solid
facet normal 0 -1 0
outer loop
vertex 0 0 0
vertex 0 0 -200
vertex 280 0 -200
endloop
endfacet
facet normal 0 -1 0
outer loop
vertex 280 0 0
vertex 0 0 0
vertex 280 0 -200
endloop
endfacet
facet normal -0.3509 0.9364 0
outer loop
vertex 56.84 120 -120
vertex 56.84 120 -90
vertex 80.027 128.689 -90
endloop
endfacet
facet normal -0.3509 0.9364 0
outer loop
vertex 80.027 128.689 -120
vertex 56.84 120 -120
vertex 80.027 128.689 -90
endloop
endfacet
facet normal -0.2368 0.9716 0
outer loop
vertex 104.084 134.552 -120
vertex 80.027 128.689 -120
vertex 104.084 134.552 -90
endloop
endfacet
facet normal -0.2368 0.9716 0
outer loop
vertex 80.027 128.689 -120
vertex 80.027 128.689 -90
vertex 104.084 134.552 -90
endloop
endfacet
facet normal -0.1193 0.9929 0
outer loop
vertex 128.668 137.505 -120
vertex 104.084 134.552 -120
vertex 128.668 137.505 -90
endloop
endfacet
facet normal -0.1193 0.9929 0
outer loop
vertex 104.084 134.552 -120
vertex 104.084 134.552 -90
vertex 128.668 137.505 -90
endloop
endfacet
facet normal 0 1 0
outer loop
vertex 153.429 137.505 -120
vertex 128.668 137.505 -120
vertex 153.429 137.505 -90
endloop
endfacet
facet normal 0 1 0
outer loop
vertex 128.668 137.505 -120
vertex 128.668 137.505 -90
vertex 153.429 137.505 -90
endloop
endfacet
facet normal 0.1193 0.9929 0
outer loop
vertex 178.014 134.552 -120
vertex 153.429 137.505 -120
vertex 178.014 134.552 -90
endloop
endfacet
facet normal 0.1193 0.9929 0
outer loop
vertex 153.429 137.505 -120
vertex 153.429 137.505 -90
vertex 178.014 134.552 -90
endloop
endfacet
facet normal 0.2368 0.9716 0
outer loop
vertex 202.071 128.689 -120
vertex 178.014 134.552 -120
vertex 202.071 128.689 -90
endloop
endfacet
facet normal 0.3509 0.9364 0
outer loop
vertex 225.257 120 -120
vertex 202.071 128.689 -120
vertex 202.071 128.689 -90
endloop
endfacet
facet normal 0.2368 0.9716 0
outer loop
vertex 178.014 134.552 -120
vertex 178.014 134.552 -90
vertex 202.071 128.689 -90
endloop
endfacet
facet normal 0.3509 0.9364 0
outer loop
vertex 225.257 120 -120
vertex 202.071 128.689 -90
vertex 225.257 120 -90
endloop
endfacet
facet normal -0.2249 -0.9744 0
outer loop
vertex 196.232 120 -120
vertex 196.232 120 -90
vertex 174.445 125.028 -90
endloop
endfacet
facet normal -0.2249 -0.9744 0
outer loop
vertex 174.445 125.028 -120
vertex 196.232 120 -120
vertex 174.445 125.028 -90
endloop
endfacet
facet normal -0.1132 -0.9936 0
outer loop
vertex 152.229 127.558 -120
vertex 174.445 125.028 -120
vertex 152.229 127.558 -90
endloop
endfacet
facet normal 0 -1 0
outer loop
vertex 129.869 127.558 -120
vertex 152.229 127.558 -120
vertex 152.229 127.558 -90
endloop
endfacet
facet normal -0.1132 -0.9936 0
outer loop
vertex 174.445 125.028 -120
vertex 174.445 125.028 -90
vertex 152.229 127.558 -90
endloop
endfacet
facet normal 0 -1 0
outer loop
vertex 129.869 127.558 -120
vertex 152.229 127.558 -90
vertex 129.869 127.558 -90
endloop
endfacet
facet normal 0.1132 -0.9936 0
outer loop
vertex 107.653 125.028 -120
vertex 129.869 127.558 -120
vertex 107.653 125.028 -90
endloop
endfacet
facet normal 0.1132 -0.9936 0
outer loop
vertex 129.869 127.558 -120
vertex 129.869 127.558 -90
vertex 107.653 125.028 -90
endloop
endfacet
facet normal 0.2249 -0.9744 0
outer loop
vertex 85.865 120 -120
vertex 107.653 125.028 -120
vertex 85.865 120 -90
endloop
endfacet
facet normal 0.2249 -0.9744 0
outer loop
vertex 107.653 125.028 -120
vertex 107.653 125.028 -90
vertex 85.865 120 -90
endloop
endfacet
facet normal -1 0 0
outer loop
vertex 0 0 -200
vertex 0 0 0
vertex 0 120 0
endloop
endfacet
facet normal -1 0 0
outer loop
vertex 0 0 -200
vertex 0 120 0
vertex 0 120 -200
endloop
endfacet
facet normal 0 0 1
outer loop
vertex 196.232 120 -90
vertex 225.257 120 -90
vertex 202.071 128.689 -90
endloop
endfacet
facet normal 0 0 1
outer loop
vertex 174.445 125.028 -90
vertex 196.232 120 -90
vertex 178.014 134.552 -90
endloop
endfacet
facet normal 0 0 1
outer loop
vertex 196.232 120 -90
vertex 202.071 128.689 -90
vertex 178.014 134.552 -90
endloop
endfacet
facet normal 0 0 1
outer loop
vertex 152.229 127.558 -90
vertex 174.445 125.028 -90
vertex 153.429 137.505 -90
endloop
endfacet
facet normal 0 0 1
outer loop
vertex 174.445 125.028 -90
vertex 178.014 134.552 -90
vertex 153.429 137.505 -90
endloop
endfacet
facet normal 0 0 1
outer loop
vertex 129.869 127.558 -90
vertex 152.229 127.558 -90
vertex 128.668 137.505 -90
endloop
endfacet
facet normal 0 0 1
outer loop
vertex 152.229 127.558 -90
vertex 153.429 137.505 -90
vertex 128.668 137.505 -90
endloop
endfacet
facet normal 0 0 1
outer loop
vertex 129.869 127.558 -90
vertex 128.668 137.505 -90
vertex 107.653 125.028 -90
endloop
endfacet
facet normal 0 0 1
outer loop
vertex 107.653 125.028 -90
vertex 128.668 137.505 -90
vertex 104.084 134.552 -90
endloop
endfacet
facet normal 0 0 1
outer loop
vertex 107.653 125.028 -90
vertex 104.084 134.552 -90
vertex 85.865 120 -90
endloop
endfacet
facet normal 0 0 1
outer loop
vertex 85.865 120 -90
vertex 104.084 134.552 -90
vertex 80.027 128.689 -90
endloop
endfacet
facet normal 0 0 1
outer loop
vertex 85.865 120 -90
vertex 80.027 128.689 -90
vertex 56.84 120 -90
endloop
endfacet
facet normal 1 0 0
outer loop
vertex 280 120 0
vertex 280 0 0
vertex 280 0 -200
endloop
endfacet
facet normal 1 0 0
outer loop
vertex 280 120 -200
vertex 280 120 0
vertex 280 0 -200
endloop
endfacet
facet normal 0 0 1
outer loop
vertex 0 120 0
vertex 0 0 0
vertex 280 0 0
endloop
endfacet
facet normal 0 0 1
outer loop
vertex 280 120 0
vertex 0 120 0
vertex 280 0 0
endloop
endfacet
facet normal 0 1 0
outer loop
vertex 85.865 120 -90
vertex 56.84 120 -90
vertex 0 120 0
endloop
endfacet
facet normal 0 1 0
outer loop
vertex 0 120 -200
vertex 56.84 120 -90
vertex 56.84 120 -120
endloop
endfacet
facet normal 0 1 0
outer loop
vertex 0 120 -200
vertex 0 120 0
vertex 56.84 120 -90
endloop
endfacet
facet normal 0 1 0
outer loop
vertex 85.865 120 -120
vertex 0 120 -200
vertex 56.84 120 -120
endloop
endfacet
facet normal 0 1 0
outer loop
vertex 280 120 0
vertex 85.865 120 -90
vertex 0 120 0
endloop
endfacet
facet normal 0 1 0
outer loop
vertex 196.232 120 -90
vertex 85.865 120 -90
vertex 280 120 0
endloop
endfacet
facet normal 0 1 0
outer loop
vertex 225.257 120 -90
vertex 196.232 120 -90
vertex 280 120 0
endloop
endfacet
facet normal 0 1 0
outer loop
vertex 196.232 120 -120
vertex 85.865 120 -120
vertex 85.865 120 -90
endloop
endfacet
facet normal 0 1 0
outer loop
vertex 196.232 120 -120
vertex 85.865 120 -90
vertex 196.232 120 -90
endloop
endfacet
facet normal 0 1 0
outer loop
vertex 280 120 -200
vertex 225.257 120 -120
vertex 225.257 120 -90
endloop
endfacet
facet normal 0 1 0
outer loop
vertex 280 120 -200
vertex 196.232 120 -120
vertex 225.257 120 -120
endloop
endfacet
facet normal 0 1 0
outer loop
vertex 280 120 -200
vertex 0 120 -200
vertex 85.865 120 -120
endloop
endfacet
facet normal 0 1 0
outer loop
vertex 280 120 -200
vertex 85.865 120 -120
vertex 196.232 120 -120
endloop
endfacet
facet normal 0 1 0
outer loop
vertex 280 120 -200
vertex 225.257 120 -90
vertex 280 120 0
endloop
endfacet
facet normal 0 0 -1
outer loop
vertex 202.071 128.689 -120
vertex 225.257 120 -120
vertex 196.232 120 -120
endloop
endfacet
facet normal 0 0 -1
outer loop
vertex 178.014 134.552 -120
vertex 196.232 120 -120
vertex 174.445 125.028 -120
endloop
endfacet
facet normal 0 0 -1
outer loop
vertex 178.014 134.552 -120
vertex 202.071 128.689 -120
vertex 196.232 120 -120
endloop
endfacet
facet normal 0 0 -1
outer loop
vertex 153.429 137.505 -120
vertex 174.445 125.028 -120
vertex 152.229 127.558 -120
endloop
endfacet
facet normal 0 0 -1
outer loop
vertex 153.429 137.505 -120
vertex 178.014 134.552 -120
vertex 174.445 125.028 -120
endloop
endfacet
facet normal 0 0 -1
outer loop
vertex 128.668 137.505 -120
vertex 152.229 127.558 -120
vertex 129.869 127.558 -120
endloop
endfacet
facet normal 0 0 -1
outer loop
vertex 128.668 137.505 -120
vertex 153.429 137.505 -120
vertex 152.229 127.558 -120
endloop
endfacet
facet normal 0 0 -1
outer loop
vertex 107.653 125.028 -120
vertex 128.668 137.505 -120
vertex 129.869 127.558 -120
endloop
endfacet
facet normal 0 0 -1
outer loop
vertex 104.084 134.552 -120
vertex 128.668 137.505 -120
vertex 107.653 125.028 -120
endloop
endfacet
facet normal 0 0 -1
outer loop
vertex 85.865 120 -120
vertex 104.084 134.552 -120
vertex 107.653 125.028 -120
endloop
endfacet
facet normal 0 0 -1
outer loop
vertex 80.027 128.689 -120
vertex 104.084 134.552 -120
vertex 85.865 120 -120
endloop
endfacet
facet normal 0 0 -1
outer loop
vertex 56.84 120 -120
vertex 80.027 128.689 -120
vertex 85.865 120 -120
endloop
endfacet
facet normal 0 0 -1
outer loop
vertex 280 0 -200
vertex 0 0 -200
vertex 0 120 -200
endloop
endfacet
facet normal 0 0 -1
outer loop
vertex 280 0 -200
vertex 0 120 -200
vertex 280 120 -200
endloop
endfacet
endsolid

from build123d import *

# Parameters (mm, degrees)
SKETCH_1_W        = 280
SKETCH_1_H        = 200
EXTRUDE_1_DEPTH   = 120
EXTRUDE_START     = -90
EXTRUDE_1_2_DEPTH = 30


with BuildPart() as part:
    # 草图1 → Extrude 1 (new body)
    with BuildSketch(Plane(origin=(0, 0, 0), x_dir=(1, 0, 0), z_dir=(0, 1, 0))):
        with Locations((140, 100)):
            Rectangle(SKETCH_1_W, SKETCH_1_H)
    extrude(amount=EXTRUDE_1_DEPTH)

    # 草图2 → Extrude 1 2 (add)
    with BuildSketch(Plane.XY.offset(EXTRUDE_START)):
        with BuildLine():
            ThreePointArc((56.840474866, 120), (141.048835122, 137.874678511), (225.257195379, 120))
            Line((225.257195379, 120), (221.194887056, 110.862295086))
            ThreePointArc((221.194887056, 110.862295086), (141.048835122, 127.874678511), (60.902783189, 110.862295086))
            Line((60.902783189, 110.862295086), (56.840474866, 120))
        make_face()
    extrude(amount=-EXTRUDE_1_2_DEPTH)


solid = part.part
